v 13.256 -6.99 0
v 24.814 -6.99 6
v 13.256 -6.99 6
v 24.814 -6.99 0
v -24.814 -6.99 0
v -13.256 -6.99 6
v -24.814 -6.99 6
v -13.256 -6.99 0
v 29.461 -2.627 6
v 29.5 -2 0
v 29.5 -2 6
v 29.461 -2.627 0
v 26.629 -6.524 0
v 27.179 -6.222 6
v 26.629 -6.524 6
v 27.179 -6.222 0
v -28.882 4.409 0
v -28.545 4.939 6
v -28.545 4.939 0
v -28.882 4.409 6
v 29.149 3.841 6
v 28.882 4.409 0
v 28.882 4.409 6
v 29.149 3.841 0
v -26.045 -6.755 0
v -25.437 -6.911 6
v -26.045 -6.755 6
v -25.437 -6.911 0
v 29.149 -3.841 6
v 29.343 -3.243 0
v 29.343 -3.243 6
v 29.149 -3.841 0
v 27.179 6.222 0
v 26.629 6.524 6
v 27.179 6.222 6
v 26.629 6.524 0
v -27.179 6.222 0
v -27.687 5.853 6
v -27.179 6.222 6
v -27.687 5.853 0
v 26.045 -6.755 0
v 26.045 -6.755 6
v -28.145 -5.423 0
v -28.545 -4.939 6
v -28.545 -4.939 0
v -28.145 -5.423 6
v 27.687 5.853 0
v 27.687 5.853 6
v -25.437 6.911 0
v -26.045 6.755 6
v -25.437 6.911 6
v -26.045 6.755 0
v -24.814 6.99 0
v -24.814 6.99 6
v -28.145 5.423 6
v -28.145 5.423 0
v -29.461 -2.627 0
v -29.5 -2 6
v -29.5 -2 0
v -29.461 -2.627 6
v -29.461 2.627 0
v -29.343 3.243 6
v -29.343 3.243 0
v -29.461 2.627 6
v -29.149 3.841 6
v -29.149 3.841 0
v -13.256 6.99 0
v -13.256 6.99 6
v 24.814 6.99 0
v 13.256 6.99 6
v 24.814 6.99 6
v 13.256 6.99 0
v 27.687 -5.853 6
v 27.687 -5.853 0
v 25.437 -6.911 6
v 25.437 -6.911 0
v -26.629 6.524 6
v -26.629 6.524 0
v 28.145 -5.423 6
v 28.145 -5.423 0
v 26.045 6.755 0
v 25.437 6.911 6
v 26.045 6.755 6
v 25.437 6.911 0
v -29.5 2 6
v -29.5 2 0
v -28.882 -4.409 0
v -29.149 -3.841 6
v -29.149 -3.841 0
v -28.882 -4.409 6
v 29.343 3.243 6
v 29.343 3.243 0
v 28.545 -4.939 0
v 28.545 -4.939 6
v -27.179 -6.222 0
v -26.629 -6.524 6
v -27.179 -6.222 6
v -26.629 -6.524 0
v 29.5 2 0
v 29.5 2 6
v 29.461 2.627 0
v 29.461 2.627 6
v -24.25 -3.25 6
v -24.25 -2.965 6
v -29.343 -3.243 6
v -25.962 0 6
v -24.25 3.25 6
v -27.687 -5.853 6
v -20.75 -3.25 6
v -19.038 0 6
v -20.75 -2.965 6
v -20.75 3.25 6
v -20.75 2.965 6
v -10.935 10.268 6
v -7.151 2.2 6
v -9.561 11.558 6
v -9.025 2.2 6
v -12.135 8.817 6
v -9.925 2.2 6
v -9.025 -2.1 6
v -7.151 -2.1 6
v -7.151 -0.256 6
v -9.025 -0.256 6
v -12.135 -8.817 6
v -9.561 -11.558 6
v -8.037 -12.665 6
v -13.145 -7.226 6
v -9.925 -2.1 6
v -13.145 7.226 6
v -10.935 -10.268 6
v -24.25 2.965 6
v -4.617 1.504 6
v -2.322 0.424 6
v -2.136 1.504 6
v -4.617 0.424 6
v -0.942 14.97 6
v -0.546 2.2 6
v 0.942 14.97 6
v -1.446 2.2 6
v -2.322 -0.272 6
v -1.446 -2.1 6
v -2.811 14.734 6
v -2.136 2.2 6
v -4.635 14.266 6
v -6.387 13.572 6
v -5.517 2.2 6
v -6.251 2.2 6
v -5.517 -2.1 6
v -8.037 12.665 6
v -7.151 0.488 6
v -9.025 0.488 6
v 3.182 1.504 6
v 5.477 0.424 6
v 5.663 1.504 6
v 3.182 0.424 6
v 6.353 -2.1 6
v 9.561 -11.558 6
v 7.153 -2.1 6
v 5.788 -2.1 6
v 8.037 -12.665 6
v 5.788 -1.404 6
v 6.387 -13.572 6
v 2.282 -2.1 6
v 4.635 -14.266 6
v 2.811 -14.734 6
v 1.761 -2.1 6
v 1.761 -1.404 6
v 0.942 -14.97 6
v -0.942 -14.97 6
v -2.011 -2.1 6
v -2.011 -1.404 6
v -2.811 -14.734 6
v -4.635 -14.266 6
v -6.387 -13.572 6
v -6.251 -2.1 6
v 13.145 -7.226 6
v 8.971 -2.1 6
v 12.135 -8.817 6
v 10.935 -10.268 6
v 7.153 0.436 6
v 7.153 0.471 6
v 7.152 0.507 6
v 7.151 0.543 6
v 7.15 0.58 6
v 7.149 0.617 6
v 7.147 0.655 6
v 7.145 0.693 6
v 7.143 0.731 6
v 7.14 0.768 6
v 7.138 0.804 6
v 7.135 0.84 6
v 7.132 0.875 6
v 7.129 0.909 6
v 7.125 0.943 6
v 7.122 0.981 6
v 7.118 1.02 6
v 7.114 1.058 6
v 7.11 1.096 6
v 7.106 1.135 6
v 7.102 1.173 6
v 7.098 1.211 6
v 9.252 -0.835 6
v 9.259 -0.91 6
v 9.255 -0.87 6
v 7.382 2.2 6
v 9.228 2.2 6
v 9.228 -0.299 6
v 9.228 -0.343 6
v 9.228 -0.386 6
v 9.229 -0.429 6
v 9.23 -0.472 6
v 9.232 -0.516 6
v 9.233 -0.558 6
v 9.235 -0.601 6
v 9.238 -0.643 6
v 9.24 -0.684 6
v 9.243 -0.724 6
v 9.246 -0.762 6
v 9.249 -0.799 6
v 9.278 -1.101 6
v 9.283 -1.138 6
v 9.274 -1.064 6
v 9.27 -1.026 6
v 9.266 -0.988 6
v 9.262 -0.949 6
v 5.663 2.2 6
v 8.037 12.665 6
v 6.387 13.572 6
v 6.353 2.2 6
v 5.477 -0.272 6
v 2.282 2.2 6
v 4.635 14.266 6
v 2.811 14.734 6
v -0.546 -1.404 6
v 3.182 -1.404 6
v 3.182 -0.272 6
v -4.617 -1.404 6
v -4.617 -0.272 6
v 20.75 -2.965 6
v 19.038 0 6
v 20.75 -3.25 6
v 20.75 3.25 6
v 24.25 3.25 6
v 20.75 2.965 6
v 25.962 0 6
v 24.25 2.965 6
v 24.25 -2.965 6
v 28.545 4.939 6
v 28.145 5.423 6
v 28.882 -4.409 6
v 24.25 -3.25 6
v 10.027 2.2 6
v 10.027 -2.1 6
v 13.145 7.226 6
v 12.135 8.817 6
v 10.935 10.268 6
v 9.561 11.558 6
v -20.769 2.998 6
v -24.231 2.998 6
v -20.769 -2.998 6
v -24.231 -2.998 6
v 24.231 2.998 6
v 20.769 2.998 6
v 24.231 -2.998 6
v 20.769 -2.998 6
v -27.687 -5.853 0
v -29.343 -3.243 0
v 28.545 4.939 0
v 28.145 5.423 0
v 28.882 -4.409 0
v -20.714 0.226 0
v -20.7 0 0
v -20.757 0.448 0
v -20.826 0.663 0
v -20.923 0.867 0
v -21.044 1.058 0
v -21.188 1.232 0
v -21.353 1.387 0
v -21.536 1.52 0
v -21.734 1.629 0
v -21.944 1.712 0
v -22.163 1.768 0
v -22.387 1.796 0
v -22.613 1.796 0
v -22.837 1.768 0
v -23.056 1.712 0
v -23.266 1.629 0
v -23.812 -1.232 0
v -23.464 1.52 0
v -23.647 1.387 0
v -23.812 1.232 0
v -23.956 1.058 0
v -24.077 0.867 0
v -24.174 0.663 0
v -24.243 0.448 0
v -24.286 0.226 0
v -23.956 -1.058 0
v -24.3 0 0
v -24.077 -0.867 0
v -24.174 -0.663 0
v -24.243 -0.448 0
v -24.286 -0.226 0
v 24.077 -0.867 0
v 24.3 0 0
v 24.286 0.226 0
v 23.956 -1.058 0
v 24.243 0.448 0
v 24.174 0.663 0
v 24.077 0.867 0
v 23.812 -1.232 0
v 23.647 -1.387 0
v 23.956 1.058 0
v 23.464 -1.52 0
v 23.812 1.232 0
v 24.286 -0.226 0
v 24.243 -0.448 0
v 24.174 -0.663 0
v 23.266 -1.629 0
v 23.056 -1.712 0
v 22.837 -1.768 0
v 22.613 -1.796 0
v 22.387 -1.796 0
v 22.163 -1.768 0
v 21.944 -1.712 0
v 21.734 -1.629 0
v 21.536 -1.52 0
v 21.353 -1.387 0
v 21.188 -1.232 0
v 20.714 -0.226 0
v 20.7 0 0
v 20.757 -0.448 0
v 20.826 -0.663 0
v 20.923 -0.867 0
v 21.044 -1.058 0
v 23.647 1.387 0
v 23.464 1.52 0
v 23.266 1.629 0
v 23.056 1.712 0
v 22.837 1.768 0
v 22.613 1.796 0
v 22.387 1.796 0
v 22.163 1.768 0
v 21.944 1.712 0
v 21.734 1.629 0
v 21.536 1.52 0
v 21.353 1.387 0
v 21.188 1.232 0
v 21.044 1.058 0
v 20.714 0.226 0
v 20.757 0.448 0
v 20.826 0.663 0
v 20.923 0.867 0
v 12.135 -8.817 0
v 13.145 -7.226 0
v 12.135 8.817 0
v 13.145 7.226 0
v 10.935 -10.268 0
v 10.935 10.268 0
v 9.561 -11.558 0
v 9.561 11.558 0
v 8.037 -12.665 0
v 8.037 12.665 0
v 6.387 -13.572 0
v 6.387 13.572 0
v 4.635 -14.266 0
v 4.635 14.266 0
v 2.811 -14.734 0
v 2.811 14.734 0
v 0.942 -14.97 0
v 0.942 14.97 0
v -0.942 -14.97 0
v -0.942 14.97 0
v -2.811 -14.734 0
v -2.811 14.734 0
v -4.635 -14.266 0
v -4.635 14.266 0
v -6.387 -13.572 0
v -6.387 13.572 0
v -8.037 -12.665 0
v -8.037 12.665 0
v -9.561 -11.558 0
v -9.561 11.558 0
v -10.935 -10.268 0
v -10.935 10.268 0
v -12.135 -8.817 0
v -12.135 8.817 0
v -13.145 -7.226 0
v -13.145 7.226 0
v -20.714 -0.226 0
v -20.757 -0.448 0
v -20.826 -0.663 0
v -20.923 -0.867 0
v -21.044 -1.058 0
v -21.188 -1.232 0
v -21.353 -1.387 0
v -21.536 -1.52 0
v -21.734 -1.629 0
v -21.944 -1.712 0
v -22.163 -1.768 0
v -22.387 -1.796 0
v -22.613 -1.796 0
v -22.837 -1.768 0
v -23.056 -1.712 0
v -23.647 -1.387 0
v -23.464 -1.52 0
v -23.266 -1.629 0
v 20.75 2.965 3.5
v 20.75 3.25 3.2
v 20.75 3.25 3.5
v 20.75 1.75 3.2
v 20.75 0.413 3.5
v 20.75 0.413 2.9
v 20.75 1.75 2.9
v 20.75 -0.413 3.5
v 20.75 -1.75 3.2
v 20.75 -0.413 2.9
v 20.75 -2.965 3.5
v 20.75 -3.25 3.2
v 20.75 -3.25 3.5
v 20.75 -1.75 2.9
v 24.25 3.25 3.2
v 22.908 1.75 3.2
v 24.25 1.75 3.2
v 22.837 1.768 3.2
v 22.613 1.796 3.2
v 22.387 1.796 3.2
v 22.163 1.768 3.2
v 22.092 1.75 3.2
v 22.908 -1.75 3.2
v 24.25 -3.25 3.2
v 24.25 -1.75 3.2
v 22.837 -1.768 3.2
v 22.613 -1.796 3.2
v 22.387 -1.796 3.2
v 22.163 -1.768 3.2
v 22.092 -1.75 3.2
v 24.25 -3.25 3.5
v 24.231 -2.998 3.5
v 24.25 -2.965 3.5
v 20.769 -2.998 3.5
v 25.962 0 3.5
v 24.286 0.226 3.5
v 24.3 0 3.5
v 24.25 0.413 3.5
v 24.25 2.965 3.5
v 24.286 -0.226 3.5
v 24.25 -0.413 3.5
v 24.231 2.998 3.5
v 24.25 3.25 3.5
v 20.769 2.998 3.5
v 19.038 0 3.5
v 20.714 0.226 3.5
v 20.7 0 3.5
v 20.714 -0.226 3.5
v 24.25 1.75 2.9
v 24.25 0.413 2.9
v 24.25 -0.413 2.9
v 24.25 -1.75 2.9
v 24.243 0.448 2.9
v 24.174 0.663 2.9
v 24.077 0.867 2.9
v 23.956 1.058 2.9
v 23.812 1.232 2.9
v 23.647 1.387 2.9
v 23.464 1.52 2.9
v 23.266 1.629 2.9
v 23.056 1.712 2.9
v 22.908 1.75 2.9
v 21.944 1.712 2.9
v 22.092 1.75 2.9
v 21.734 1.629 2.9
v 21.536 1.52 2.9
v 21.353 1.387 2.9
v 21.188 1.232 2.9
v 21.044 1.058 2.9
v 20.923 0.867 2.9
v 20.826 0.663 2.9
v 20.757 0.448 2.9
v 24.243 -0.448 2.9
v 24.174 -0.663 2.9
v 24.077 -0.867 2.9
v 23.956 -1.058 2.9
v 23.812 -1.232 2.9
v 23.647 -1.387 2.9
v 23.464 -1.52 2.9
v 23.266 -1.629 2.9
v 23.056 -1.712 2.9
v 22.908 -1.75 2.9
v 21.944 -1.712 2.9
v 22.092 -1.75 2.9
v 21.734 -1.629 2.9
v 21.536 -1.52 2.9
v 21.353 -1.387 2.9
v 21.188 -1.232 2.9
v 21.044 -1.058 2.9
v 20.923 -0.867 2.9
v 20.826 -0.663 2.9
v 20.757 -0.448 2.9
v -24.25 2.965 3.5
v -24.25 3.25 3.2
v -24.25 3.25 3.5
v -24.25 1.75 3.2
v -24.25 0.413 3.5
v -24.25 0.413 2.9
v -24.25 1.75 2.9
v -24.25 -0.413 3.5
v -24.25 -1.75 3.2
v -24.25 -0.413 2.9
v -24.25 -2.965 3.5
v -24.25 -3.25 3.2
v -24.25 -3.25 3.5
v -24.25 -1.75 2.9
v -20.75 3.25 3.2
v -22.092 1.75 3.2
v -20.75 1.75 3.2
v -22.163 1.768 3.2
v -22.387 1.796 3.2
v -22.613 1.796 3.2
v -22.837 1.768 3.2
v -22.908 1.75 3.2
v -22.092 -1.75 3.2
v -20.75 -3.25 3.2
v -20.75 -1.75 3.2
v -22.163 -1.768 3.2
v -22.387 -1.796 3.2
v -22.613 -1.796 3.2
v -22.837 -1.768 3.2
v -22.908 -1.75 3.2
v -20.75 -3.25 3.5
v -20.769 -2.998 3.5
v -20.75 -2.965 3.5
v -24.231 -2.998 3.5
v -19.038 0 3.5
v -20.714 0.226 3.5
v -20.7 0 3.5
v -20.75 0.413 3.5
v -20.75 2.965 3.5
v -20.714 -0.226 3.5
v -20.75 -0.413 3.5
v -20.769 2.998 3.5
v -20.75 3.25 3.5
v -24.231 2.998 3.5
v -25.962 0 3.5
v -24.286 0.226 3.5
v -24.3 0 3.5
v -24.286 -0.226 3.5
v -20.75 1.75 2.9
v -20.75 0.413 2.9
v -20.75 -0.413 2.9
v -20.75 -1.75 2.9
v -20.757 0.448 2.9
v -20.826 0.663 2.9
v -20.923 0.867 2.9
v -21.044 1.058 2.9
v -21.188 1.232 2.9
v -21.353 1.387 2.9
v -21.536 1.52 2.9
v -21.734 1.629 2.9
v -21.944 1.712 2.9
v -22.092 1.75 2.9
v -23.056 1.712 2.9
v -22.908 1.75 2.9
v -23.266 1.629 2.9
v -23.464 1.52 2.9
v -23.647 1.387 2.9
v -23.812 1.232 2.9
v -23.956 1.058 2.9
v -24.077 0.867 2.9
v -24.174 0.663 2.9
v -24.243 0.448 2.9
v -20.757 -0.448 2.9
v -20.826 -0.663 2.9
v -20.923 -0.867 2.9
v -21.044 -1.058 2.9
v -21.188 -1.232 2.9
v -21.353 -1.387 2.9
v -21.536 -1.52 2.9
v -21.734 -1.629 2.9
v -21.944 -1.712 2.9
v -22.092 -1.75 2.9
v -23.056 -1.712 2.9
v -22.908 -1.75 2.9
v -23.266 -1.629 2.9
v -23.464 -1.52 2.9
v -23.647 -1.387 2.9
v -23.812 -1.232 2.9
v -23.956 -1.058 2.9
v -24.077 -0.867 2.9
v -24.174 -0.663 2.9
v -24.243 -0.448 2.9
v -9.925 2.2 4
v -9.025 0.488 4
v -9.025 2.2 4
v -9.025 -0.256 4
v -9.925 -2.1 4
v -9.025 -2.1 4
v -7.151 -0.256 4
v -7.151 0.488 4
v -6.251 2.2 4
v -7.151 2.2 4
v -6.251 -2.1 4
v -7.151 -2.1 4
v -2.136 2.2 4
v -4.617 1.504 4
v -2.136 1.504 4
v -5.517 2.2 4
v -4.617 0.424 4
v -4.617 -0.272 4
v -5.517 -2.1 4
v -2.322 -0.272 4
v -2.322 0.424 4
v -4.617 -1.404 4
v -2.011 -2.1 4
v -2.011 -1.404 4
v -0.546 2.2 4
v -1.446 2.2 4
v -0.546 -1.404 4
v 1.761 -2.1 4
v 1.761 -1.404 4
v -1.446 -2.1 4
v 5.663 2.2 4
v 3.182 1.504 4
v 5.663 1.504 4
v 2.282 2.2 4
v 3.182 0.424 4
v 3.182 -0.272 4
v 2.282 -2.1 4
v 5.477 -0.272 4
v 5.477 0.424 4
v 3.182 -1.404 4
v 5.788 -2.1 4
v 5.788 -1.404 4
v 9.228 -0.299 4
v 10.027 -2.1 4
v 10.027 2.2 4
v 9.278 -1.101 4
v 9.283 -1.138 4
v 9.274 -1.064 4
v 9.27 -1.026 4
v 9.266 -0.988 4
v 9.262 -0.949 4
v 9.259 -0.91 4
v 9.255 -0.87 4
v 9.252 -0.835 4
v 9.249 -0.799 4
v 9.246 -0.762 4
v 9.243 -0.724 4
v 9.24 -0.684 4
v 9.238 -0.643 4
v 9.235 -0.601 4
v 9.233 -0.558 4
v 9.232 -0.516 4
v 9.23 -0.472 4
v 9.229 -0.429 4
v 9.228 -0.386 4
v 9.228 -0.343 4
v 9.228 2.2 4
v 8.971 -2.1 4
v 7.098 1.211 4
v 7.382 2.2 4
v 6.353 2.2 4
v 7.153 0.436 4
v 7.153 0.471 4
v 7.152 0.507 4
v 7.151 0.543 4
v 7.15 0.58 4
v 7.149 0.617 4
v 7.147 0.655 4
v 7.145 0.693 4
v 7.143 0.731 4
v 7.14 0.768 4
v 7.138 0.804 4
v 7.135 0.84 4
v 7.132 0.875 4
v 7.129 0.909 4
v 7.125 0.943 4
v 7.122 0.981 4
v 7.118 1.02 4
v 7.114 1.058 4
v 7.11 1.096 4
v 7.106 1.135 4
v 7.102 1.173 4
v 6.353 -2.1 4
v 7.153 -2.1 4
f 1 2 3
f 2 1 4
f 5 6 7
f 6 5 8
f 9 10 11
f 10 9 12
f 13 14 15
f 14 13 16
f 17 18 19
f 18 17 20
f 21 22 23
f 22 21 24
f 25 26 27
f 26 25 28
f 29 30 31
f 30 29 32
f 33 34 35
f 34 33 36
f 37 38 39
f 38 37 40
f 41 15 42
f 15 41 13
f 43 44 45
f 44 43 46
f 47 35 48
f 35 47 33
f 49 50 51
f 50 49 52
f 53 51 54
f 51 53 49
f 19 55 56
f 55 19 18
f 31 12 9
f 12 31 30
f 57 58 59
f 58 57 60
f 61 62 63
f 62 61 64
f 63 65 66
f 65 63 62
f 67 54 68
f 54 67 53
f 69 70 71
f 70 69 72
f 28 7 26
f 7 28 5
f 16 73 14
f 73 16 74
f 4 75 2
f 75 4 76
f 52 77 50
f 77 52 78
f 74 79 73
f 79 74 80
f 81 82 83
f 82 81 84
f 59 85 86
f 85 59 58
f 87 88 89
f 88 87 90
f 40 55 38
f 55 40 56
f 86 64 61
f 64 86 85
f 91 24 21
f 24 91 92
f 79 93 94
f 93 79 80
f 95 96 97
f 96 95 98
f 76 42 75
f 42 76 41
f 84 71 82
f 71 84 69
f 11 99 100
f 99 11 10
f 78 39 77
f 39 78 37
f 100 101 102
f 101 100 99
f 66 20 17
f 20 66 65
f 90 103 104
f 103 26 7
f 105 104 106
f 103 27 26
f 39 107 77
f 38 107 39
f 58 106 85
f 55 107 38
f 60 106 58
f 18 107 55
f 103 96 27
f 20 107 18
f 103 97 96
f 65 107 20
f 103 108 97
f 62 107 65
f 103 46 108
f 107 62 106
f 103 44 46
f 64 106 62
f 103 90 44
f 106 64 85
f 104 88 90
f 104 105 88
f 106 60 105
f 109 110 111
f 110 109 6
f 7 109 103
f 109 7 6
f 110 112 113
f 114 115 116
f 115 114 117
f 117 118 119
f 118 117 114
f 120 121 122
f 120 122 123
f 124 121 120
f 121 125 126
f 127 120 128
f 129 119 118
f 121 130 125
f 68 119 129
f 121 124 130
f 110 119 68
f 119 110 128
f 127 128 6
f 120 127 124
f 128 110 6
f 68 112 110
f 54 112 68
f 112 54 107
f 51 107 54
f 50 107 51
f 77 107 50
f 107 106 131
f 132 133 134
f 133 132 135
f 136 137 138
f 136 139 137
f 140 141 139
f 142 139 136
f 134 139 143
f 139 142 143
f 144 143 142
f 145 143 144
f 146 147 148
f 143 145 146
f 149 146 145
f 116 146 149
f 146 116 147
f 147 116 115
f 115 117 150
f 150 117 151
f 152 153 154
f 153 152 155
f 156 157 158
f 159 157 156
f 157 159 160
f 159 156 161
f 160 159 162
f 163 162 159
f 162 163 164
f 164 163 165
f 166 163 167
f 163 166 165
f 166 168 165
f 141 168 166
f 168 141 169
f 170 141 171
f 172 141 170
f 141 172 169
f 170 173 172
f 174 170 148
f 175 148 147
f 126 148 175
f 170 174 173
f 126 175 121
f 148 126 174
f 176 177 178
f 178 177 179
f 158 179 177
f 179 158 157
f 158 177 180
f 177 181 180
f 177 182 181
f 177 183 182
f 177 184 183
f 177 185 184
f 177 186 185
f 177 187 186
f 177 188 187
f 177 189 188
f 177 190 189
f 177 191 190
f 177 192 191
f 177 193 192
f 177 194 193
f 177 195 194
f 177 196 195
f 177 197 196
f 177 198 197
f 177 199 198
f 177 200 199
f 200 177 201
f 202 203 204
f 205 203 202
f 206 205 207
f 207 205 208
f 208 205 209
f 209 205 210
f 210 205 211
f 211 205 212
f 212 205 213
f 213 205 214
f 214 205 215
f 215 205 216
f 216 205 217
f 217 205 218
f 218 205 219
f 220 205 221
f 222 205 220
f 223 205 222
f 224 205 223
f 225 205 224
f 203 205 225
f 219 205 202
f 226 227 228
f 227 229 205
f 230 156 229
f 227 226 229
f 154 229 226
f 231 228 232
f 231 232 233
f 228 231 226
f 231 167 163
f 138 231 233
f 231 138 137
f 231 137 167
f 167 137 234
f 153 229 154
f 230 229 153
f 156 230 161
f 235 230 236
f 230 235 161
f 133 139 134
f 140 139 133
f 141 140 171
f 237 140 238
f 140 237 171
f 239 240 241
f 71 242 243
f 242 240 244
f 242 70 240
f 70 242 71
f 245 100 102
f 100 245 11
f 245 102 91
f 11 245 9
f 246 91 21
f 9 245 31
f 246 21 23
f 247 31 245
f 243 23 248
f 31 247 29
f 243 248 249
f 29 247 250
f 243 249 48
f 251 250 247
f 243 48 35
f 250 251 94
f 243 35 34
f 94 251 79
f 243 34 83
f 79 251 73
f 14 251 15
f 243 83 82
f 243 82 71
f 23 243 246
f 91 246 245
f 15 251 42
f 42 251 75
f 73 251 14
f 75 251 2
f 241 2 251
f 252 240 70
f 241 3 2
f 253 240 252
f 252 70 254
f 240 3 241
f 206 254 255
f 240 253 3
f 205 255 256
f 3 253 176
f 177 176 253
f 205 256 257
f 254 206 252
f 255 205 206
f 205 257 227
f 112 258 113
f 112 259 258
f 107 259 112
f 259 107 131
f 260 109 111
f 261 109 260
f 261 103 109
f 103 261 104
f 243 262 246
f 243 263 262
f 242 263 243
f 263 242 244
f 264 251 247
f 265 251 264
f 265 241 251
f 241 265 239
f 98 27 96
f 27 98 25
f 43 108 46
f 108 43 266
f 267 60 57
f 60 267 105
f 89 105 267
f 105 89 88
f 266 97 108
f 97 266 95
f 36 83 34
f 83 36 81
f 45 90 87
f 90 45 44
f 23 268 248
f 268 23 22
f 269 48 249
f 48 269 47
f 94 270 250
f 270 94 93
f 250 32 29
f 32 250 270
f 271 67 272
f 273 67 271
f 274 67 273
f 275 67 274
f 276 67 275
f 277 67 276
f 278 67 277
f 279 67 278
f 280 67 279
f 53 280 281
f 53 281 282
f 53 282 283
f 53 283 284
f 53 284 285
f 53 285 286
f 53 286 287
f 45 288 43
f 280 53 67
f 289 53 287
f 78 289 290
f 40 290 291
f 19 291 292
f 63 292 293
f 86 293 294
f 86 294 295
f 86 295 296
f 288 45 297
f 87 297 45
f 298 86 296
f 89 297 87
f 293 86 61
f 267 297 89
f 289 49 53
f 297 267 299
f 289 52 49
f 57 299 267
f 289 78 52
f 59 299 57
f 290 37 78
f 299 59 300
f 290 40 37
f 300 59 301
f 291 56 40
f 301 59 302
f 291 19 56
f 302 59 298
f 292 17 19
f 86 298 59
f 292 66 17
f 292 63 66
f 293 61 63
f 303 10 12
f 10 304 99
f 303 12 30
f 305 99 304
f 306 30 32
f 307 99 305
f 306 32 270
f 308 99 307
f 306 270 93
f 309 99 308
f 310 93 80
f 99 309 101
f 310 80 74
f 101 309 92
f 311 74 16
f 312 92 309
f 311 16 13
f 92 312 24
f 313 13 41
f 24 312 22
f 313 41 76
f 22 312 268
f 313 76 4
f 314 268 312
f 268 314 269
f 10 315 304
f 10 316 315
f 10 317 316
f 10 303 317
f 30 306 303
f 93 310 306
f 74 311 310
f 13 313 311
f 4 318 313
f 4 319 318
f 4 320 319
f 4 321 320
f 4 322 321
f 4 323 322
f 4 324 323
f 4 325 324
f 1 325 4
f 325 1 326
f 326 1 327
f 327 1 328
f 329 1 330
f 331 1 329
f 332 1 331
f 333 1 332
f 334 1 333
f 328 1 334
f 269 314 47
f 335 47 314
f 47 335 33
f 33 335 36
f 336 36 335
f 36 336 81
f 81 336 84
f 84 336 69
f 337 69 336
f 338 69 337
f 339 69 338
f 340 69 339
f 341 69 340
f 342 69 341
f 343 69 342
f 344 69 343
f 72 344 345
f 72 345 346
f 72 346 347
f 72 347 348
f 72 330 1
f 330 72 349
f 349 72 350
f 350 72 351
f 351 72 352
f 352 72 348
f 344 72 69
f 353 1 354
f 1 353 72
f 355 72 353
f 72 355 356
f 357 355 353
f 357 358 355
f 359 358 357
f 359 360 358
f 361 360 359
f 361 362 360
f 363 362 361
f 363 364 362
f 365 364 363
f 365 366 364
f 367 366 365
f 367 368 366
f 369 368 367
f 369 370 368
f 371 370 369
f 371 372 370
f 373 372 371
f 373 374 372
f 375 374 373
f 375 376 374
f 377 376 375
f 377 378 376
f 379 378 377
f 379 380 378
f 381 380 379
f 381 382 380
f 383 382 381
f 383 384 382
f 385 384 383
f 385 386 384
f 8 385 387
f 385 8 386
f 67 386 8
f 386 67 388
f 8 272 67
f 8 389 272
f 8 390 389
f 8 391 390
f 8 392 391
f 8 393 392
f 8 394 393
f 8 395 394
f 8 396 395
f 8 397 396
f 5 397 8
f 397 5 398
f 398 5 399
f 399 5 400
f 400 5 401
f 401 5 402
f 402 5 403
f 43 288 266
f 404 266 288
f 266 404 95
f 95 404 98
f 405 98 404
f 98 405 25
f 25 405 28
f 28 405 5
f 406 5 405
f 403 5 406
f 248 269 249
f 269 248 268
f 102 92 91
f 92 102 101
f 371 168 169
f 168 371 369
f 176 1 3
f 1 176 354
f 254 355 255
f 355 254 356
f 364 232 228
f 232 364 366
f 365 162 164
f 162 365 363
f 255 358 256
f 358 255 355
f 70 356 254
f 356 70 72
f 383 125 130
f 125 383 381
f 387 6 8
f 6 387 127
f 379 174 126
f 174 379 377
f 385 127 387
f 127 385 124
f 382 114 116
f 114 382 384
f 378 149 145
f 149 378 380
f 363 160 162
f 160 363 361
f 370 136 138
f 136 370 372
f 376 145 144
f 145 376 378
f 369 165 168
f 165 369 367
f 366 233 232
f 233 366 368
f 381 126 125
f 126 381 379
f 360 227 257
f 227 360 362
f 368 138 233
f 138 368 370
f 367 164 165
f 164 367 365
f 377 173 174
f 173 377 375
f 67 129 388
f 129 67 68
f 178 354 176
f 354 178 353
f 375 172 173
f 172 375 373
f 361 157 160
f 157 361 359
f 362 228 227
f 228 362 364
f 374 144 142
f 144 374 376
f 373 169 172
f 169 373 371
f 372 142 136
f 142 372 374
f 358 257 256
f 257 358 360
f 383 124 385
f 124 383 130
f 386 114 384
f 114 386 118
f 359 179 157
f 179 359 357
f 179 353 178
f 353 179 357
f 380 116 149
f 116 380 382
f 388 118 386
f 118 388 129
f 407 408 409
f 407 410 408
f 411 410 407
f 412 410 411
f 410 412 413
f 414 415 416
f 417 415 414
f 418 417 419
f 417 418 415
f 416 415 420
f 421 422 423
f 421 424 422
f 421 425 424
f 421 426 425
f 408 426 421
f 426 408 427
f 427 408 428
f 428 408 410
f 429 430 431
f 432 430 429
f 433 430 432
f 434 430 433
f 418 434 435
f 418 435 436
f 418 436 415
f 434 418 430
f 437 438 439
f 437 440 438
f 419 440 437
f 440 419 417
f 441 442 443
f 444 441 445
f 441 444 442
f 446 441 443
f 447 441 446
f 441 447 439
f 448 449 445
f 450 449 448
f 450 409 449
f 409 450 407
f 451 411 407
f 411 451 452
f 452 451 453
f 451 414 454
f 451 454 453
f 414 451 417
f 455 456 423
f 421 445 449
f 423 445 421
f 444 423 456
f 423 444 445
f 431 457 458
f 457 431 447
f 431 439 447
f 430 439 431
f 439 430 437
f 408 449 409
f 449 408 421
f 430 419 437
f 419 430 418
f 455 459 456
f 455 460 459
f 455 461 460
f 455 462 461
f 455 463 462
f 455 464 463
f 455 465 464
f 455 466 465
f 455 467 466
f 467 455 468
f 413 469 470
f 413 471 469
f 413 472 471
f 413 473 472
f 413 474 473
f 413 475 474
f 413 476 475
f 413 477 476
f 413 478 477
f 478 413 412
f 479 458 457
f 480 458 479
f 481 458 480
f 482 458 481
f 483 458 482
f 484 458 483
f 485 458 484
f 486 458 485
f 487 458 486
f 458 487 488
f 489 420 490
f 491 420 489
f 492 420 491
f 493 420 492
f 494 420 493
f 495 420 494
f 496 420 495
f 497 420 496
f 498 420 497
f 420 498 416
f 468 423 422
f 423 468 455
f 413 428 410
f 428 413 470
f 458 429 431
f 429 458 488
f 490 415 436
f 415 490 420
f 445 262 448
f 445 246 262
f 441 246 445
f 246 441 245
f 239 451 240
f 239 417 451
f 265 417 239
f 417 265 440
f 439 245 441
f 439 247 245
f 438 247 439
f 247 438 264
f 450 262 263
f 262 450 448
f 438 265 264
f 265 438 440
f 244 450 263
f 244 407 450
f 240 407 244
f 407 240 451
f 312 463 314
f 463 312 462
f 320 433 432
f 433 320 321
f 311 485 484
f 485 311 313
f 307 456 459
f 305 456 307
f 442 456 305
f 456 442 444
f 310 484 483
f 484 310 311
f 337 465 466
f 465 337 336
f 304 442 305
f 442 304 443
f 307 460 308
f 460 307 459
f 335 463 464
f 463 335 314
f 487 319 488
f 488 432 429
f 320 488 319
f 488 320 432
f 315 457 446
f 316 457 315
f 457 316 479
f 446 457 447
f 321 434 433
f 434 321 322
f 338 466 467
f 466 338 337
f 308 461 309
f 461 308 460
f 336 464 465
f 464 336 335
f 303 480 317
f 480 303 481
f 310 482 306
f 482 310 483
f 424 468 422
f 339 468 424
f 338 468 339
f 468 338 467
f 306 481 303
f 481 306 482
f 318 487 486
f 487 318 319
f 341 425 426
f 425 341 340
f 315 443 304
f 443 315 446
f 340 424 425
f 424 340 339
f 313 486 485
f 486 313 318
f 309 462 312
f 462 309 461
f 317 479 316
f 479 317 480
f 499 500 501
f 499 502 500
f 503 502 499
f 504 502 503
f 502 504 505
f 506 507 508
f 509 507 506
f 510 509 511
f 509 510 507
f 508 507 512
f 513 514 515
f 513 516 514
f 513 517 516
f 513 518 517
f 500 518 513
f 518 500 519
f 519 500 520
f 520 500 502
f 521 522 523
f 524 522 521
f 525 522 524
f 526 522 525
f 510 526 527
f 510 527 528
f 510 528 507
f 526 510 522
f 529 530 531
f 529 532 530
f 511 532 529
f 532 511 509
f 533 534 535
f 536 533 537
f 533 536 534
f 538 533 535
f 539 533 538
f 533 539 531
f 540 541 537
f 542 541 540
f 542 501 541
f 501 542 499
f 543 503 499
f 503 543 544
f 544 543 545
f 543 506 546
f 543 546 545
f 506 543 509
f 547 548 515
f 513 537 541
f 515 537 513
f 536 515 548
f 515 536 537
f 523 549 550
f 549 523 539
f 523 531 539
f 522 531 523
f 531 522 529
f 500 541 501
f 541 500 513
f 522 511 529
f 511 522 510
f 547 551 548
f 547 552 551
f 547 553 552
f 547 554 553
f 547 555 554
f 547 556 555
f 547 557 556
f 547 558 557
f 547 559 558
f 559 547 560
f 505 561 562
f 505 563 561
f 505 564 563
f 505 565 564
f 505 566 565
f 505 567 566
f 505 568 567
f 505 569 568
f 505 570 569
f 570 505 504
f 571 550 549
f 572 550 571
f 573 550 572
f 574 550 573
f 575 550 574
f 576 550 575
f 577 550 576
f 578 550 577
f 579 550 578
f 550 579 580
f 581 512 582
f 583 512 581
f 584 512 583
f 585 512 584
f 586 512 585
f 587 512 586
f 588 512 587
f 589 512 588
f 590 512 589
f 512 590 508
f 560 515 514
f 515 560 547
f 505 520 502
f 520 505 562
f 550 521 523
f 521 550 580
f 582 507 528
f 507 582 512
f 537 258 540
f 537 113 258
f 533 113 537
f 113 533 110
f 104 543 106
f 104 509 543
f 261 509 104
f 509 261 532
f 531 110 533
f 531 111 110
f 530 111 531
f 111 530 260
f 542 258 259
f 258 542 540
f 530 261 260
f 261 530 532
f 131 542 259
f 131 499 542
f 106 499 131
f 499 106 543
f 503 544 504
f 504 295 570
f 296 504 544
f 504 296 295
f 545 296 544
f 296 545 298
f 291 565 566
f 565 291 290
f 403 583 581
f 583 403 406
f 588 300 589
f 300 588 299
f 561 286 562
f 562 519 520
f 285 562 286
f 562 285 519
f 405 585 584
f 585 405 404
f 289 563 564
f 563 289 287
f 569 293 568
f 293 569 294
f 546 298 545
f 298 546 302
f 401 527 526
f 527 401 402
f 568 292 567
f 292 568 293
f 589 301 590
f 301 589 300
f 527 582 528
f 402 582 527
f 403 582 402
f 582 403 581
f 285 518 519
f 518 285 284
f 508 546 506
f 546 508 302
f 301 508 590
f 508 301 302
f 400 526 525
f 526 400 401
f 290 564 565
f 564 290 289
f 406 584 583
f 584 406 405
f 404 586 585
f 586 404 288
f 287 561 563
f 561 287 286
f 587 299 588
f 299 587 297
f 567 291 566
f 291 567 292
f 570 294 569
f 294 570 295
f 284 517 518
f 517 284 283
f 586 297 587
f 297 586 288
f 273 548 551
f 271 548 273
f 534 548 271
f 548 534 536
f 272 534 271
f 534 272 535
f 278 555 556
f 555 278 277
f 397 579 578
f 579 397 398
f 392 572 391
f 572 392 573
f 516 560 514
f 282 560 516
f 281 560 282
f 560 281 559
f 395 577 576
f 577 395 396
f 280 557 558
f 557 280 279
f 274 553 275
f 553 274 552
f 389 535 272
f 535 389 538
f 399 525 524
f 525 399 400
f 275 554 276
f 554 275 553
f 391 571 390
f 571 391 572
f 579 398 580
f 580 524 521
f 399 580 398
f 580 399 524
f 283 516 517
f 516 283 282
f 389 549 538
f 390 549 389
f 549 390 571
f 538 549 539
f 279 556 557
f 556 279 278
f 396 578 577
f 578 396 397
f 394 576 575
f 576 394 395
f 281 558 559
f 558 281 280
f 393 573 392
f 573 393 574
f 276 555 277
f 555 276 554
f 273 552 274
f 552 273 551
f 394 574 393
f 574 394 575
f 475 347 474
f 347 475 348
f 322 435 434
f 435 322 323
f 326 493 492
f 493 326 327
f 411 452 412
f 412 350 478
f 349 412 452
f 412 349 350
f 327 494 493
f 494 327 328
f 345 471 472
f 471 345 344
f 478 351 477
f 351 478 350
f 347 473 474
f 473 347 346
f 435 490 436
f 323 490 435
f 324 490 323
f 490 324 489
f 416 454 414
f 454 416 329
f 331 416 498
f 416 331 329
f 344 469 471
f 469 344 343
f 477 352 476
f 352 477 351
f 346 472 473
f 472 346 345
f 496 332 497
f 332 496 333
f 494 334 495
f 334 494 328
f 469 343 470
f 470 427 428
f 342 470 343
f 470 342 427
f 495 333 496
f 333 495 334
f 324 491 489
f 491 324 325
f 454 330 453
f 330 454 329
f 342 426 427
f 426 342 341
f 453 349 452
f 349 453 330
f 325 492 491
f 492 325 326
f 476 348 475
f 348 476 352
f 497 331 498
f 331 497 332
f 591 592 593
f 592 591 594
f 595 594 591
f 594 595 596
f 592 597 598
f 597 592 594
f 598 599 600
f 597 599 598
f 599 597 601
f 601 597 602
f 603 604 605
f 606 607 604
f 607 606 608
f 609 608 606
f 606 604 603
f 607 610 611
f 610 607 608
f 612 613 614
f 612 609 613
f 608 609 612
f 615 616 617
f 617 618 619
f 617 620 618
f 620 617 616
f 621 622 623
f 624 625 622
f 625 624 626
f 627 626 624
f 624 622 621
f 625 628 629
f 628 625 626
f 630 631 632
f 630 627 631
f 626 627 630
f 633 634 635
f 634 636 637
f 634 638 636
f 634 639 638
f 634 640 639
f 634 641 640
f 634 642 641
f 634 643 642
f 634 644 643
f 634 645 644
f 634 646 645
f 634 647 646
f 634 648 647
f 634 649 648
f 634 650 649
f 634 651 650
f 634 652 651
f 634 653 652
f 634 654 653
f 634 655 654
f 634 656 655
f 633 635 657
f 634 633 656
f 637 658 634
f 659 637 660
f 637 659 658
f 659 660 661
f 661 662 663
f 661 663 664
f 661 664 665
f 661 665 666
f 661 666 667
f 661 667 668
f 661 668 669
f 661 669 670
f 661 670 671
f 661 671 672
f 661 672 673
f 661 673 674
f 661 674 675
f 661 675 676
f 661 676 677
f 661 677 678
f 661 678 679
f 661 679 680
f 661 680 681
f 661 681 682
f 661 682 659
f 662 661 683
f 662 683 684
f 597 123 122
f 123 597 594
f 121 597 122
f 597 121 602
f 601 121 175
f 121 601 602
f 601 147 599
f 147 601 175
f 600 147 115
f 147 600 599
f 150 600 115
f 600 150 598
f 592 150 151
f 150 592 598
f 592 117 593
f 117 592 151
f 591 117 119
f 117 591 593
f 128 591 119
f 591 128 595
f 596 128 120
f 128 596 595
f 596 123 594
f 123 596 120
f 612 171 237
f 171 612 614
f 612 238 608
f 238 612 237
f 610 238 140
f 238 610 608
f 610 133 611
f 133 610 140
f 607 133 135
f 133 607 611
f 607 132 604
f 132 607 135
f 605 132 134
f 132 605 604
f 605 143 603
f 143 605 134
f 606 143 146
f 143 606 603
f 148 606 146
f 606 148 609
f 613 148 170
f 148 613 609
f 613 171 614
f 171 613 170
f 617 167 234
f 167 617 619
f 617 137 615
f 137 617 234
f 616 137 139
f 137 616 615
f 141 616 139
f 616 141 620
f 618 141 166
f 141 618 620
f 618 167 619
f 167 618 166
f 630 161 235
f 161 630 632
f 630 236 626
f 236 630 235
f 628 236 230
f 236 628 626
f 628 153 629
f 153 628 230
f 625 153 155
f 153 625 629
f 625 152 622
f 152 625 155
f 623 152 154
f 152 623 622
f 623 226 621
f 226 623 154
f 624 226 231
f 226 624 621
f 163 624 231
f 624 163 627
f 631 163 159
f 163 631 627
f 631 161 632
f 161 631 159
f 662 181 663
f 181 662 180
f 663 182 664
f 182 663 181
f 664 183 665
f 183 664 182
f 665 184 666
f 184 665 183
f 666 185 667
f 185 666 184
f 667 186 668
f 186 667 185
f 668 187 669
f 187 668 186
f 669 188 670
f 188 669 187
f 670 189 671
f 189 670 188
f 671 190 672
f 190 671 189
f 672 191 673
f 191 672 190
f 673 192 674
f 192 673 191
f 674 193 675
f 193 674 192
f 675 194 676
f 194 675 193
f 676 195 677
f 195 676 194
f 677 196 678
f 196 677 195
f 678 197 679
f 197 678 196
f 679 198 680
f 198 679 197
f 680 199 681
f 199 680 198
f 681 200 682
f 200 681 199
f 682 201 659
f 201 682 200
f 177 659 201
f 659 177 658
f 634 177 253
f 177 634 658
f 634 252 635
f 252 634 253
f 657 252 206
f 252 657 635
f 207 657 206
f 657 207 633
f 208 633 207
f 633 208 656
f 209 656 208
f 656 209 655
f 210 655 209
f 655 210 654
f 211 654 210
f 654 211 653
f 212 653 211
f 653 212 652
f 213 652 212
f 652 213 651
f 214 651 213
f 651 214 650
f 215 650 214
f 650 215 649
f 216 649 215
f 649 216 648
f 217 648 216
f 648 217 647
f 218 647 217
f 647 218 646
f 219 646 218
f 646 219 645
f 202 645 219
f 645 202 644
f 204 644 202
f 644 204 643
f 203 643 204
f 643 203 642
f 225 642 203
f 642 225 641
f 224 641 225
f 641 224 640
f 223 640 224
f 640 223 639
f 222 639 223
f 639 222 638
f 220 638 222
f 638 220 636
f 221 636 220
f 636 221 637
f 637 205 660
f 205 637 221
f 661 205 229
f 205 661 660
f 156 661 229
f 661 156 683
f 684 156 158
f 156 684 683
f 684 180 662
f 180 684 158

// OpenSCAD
$fn = 50;


difference() {
	union() {
		hull() {
			translate(v = [-24.5000000000, 2.0000000000, 0]) {
				cylinder(h = 6, r = 5);
			}
			translate(v = [24.5000000000, 2.0000000000, 0]) {
				cylinder(h = 6, r = 5);
			}
			translate(v = [-24.5000000000, -2.0000000000, 0]) {
				cylinder(h = 6, r = 5);
			}
			translate(v = [24.5000000000, -2.0000000000, 0]) {
				cylinder(h = 6, r = 5);
			}
		}
		cylinder(h = 6, r = 15.0000000000);
	}
	union() {
		translate(v = [22.5000000000, 0, -20]) {
			rotate(a = [0, 180, 0]) {
				difference() {
					union() {
						translate(v = [0, 0, -26.0000000000]) {
							rotate(a = [0, 0, 0]) {
								difference() {
									union() {
										#translate(v = [-1.7500000000, -3.2500000000, -0.3000000000]) {
											cube(size = [3.5000000000, 6.5000000000, 0.3000000000]);
										}
										#translate(v = [-1.7500000000, -1.7500000000, -0.6000000000]) {
											cube(size = [3.5000000000, 3.5000000000, 0.3000000000]);
										}
										#translate(v = [-1.7500000000, -3.2500000000, 2.5000000000]) {
											cube(size = [3.5000000000, 6.5000000000, 0.3000000000]);
										}
										#translate(v = [-1.7500000000, -1.7500000000, 2.8000000000]) {
											cube(size = [3.5000000000, 3.5000000000, 0.3000000000]);
										}
										#linear_extrude(height = 2.5000000000) {
											polygon(points = [[3.4620000000, 0.0000000000], [1.7310000000, 2.9981799479], [-1.7310000000, 2.9981799479], [-3.4620000000, 0.0000000000], [-1.7310000000, -2.9981799479], [1.7310000000, -2.9981799479]]);
										}
										#translate(v = [-1.7500000000, -3.2500000000, -0.3000000000]) {
											cube(size = [3.5000000000, 6.5000000000, 0.3000000000]);
										}
										#translate(v = [-1.7500000000, -1.7500000000, -0.6000000000]) {
											cube(size = [3.5000000000, 3.5000000000, 0.3000000000]);
										}
										#translate(v = [-1.7500000000, -3.2500000000, 2.5000000000]) {
											cube(size = [3.5000000000, 6.5000000000, 0.3000000000]);
										}
										#translate(v = [-1.7500000000, -1.7500000000, 2.8000000000]) {
											cube(size = [3.5000000000, 3.5000000000, 0.3000000000]);
										}
										#translate(v = [-1.7500000000, -3.2500000000, -0.3000000000]) {
											cube(size = [3.5000000000, 6.5000000000, 0.3000000000]);
										}
										#translate(v = [-1.7500000000, -1.7500000000, -0.6000000000]) {
											cube(size = [3.5000000000, 3.5000000000, 0.3000000000]);
										}
										#translate(v = [-1.7500000000, -3.2500000000, 2.5000000000]) {
											cube(size = [3.5000000000, 6.5000000000, 0.3000000000]);
										}
										#translate(v = [-1.7500000000, -1.7500000000, 2.8000000000]) {
											cube(size = [3.5000000000, 3.5000000000, 0.3000000000]);
										}
									}
									union();
								}
							}
						}
						translate(v = [0, 0, -26.0000000000]) {
							rotate(a = [0, 0, 0]) {
								difference() {
									union() {
										#translate(v = [-1.7500000000, -3.2500000000, -0.3000000000]) {
											cube(size = [3.5000000000, 6.5000000000, 0.3000000000]);
										}
										#translate(v = [-1.7500000000, -1.7500000000, -0.6000000000]) {
											cube(size = [3.5000000000, 3.5000000000, 0.3000000000]);
										}
										#translate(v = [-1.7500000000, -3.2500000000, 2.5000000000]) {
											cube(size = [3.5000000000, 6.5000000000, 0.3000000000]);
										}
										#translate(v = [-1.7500000000, -1.7500000000, 2.8000000000]) {
											cube(size = [3.5000000000, 3.5000000000, 0.3000000000]);
										}
										#linear_extrude(height = 2.5000000000) {
											polygon(points = [[3.4620000000, 0.0000000000], [1.7310000000, 2.9981799479], [-1.7310000000, 2.9981799479], [-3.4620000000, 0.0000000000], [-1.7310000000, -2.9981799479], [1.7310000000, -2.9981799479]]);
										}
										#translate(v = [-1.7500000000, -3.2500000000, -0.3000000000]) {
											cube(size = [3.5000000000, 6.5000000000, 0.3000000000]);
										}
										#translate(v = [-1.7500000000, -1.7500000000, -0.6000000000]) {
											cube(size = [3.5000000000, 3.5000000000, 0.3000000000]);
										}
										#translate(v = [-1.7500000000, -3.2500000000, 2.5000000000]) {
											cube(size = [3.5000000000, 6.5000000000, 0.3000000000]);
										}
										#translate(v = [-1.7500000000, -1.7500000000, 2.8000000000]) {
											cube(size = [3.5000000000, 3.5000000000, 0.3000000000]);
										}
										#translate(v = [-1.7500000000, -3.2500000000, -0.3000000000]) {
											cube(size = [3.5000000000, 6.5000000000, 0.3000000000]);
										}
										#translate(v = [-1.7500000000, -1.7500000000, -0.6000000000]) {
											cube(size = [3.5000000000, 3.5000000000, 0.3000000000]);
										}
										#translate(v = [-1.7500000000, -3.2500000000, 2.5000000000]) {
											cube(size = [3.5000000000, 6.5000000000, 0.3000000000]);
										}
										#translate(v = [-1.7500000000, -1.7500000000, 2.8000000000]) {
											cube(size = [3.5000000000, 3.5000000000, 0.3000000000]);
										}
									}
									union();
								}
							}
						}
						translate(v = [0, 0, -26.0000000000]) {
							rotate(a = [0, 0, 0]) {
								difference() {
									union() {
										#translate(v = [-1.7500000000, -3.2500000000, -0.3000000000]) {
											cube(size = [3.5000000000, 6.5000000000, 0.3000000000]);
										}
										#translate(v = [-1.7500000000, -1.7500000000, -0.6000000000]) {
											cube(size = [3.5000000000, 3.5000000000, 0.3000000000]);
										}
										#translate(v = [-1.7500000000, -3.2500000000, 2.5000000000]) {
											cube(size = [3.5000000000, 6.5000000000, 0.3000000000]);
										}
										#translate(v = [-1.7500000000, -1.7500000000, 2.8000000000]) {
											cube(size = [3.5000000000, 3.5000000000, 0.3000000000]);
										}
										#linear_extrude(height = 2.5000000000) {
											polygon(points = [[3.4620000000, 0.0000000000], [1.7310000000, 2.9981799479], [-1.7310000000, 2.9981799479], [-3.4620000000, 0.0000000000], [-1.7310000000, -2.9981799479], [1.7310000000, -2.9981799479]]);
										}
										#translate(v = [-1.7500000000, -3.2500000000, -0.3000000000]) {
											cube(size = [3.5000000000, 6.5000000000, 0.3000000000]);
										}
										#translate(v = [-1.7500000000, -1.7500000000, -0.6000000000]) {
											cube(size = [3.5000000000, 3.5000000000, 0.3000000000]);
										}
										#translate(v = [-1.7500000000, -3.2500000000, 2.5000000000]) {
											cube(size = [3.5000000000, 6.5000000000, 0.3000000000]);
										}
										#translate(v = [-1.7500000000, -1.7500000000, 2.8000000000]) {
											cube(size = [3.5000000000, 3.5000000000, 0.3000000000]);
										}
										#translate(v = [-1.7500000000, -3.2500000000, -0.3000000000]) {
											cube(size = [3.5000000000, 6.5000000000, 0.3000000000]);
										}
										#translate(v = [-1.7500000000, -1.7500000000, -0.6000000000]) {
											cube(size = [3.5000000000, 3.5000000000, 0.3000000000]);
										}
										#translate(v = [-1.7500000000, -3.2500000000, 2.5000000000]) {
											cube(size = [3.5000000000, 6.5000000000, 0.3000000000]);
										}
										#translate(v = [-1.7500000000, -1.7500000000, 2.8000000000]) {
											cube(size = [3.5000000000, 3.5000000000, 0.3000000000]);
										}
									}
									union();
								}
							}
						}
						#translate(v = [0, 0, -26.0000000000]) {
							cylinder(h = 26, r = 1.5000000000);
						}
						#translate(v = [0, 0, -1.9000000000]) {
							cylinder(h = 1.9000000000, r1 = 1.8000000000, r2 = 3.6000000000);
						}
						#translate(v = [0, 0, -26.0000000000]) {
							cylinder(h = 26, r = 1.8000000000);
						}
						#translate(v = [0, 0, -26.0000000000]) {
							cylinder(h = 26, r = 1.5000000000);
						}
					}
					union();
				}
			}
		}
		translate(v = [-22.5000000000, 0, -20]) {
			rotate(a = [0, 180, 0]) {
				difference() {
					union() {
						translate(v = [0, 0, -26.0000000000]) {
							rotate(a = [0, 0, 0]) {
								difference() {
									union() {
										#translate(v = [-1.7500000000, -3.2500000000, -0.3000000000]) {
											cube(size = [3.5000000000, 6.5000000000, 0.3000000000]);
										}
										#translate(v = [-1.7500000000, -1.7500000000, -0.6000000000]) {
											cube(size = [3.5000000000, 3.5000000000, 0.3000000000]);
										}
										#translate(v = [-1.7500000000, -3.2500000000, 2.5000000000]) {
											cube(size = [3.5000000000, 6.5000000000, 0.3000000000]);
										}
										#translate(v = [-1.7500000000, -1.7500000000, 2.8000000000]) {
											cube(size = [3.5000000000, 3.5000000000, 0.3000000000]);
										}
										#linear_extrude(height = 2.5000000000) {
											polygon(points = [[3.4620000000, 0.0000000000], [1.7310000000, 2.9981799479], [-1.7310000000, 2.9981799479], [-3.4620000000, 0.0000000000], [-1.7310000000, -2.9981799479], [1.7310000000, -2.9981799479]]);
										}
										#translate(v = [-1.7500000000, -3.2500000000, -0.3000000000]) {
											cube(size = [3.5000000000, 6.5000000000, 0.3000000000]);
										}
										#translate(v = [-1.7500000000, -1.7500000000, -0.6000000000]) {
											cube(size = [3.5000000000, 3.5000000000, 0.3000000000]);
										}
										#translate(v = [-1.7500000000, -3.2500000000, 2.5000000000]) {
											cube(size = [3.5000000000, 6.5000000000, 0.3000000000]);
										}
										#translate(v = [-1.7500000000, -1.7500000000, 2.8000000000]) {
											cube(size = [3.5000000000, 3.5000000000, 0.3000000000]);
										}
										#translate(v = [-1.7500000000, -3.2500000000, -0.3000000000]) {
											cube(size = [3.5000000000, 6.5000000000, 0.3000000000]);
										}
										#translate(v = [-1.7500000000, -1.7500000000, -0.6000000000]) {
											cube(size = [3.5000000000, 3.5000000000, 0.3000000000]);
										}
										#translate(v = [-1.7500000000, -3.2500000000, 2.5000000000]) {
											cube(size = [3.5000000000, 6.5000000000, 0.3000000000]);
										}
										#translate(v = [-1.7500000000, -1.7500000000, 2.8000000000]) {
											cube(size = [3.5000000000, 3.5000000000, 0.3000000000]);
										}
									}
									union();
								}
							}
						}
						translate(v = [0, 0, -26.0000000000]) {
							rotate(a = [0, 0, 0]) {
								difference() {
									union() {
										#translate(v = [-1.7500000000, -3.2500000000, -0.3000000000]) {
											cube(size = [3.5000000000, 6.5000000000, 0.3000000000]);
										}
										#translate(v = [-1.7500000000, -1.7500000000, -0.6000000000]) {
											cube(size = [3.5000000000, 3.5000000000, 0.3000000000]);
										}
										#translate(v = [-1.7500000000, -3.2500000000, 2.5000000000]) {
											cube(size = [3.5000000000, 6.5000000000, 0.3000000000]);
										}
										#translate(v = [-1.7500000000, -1.7500000000, 2.8000000000]) {
											cube(size = [3.5000000000, 3.5000000000, 0.3000000000]);
										}
										#linear_extrude(height = 2.5000000000) {
											polygon(points = [[3.4620000000, 0.0000000000], [1.7310000000, 2.9981799479], [-1.7310000000, 2.9981799479], [-3.4620000000, 0.0000000000], [-1.7310000000, -2.9981799479], [1.7310000000, -2.9981799479]]);
										}
										#translate(v = [-1.7500000000, -3.2500000000, -0.3000000000]) {
											cube(size = [3.5000000000, 6.5000000000, 0.3000000000]);
										}
										#translate(v = [-1.7500000000, -1.7500000000, -0.6000000000]) {
											cube(size = [3.5000000000, 3.5000000000, 0.3000000000]);
										}
										#translate(v = [-1.7500000000, -3.2500000000, 2.5000000000]) {
											cube(size = [3.5000000000, 6.5000000000, 0.3000000000]);
										}
										#translate(v = [-1.7500000000, -1.7500000000, 2.8000000000]) {
											cube(size = [3.5000000000, 3.5000000000, 0.3000000000]);
										}
										#translate(v = [-1.7500000000, -3.2500000000, -0.3000000000]) {
											cube(size = [3.5000000000, 6.5000000000, 0.3000000000]);
										}
										#translate(v = [-1.7500000000, -1.7500000000, -0.6000000000]) {
											cube(size = [3.5000000000, 3.5000000000, 0.3000000000]);
										}
										#translate(v = [-1.7500000000, -3.2500000000, 2.5000000000]) {
											cube(size = [3.5000000000, 6.5000000000, 0.3000000000]);
										}
										#translate(v = [-1.7500000000, -1.7500000000, 2.8000000000]) {
											cube(size = [3.5000000000, 3.5000000000, 0.3000000000]);
										}
									}
									union();
								}
							}
						}
						translate(v = [0, 0, -26.0000000000]) {
							rotate(a = [0, 0, 0]) {
								difference() {
									union() {
										#translate(v = [-1.7500000000, -3.2500000000, -0.3000000000]) {
											cube(size = [3.5000000000, 6.5000000000, 0.3000000000]);
										}
										#translate(v = [-1.7500000000, -1.7500000000, -0.6000000000]) {
											cube(size = [3.5000000000, 3.5000000000, 0.3000000000]);
										}
										#translate(v = [-1.7500000000, -3.2500000000, 2.5000000000]) {
											cube(size = [3.5000000000, 6.5000000000, 0.3000000000]);
										}
										#translate(v = [-1.7500000000, -1.7500000000, 2.8000000000]) {
											cube(size = [3.5000000000, 3.5000000000, 0.3000000000]);
										}
										#linear_extrude(height = 2.5000000000) {
											polygon(points = [[3.4620000000, 0.0000000000], [1.7310000000, 2.9981799479], [-1.7310000000, 2.9981799479], [-3.4620000000, 0.0000000000], [-1.7310000000, -2.9981799479], [1.7310000000, -2.9981799479]]);
										}
										#translate(v = [-1.7500000000, -3.2500000000, -0.3000000000]) {
											cube(size = [3.5000000000, 6.5000000000, 0.3000000000]);
										}
										#translate(v = [-1.7500000000, -1.7500000000, -0.6000000000]) {
											cube(size = [3.5000000000, 3.5000000000, 0.3000000000]);
										}
										#translate(v = [-1.7500000000, -3.2500000000, 2.5000000000]) {
											cube(size = [3.5000000000, 6.5000000000, 0.3000000000]);
										}
										#translate(v = [-1.7500000000, -1.7500000000, 2.8000000000]) {
											cube(size = [3.5000000000, 3.5000000000, 0.3000000000]);
										}
										#translate(v = [-1.7500000000, -3.2500000000, -0.3000000000]) {
											cube(size = [3.5000000000, 6.5000000000, 0.3000000000]);
										}
										#translate(v = [-1.7500000000, -1.7500000000, -0.6000000000]) {
											cube(size = [3.5000000000, 3.5000000000, 0.3000000000]);
										}
										#translate(v = [-1.7500000000, -3.2500000000, 2.5000000000]) {
											cube(size = [3.5000000000, 6.5000000000, 0.3000000000]);
										}
										#translate(v = [-1.7500000000, -1.7500000000, 2.8000000000]) {
											cube(size = [3.5000000000, 3.5000000000, 0.3000000000]);
										}
									}
									union();
								}
							}
						}
						#translate(v = [0, 0, -26.0000000000]) {
							cylinder(h = 26, r = 1.5000000000);
						}
						#translate(v = [0, 0, -1.9000000000]) {
							cylinder(h = 1.9000000000, r1 = 1.8000000000, r2 = 3.6000000000);
						}
						#translate(v = [0, 0, -26.0000000000]) {
							cylinder(h = 26, r = 1.8000000000);
						}
						#translate(v = [0, 0, -26.0000000000]) {
							cylinder(h = 26, r = 1.5000000000);
						}
					}
					union();
				}
			}
		}
		translate(v = [-22.5000000000, 0.0000000000, 0]) {
			cylinder(h = 6, r = 1.8000000000);
		}
		translate(v = [22.5000000000, 0.0000000000, 0]) {
			cylinder(h = 6, r = 1.8000000000);
		}
		translate(v = [-22.5000000000, 0.0000000000, 0]) {
			cylinder(h = 6, r = 1.8000000000);
		}
		translate(v = [22.5000000000, 0.0000000000, 0]) {
			cylinder(h = 6, r = 1.8000000000);
		}
		translate(v = [-22.5000000000, 0.0000000000, 0]) {
			cylinder(h = 6, r = 1.8000000000);
		}
		translate(v = [22.5000000000, 0.0000000000, 0]) {
			cylinder(h = 6, r = 1.8000000000);
		}
		translate(v = [-22.5000000000, 0.0000000000, 0]) {
			cylinder(h = 6, r = 1.8000000000);
		}
		translate(v = [22.5000000000, 0.0000000000, 0]) {
			cylinder(h = 6, r = 1.8000000000);
		}
		#translate(v = [0, 0, 4]) {
			linear_extrude(height = 2) {
				text(font = "Arial:Bold", halign = "center", size = 4.5000000000, text = "HELEN", valign = "center");
			}
		}
	}
}
